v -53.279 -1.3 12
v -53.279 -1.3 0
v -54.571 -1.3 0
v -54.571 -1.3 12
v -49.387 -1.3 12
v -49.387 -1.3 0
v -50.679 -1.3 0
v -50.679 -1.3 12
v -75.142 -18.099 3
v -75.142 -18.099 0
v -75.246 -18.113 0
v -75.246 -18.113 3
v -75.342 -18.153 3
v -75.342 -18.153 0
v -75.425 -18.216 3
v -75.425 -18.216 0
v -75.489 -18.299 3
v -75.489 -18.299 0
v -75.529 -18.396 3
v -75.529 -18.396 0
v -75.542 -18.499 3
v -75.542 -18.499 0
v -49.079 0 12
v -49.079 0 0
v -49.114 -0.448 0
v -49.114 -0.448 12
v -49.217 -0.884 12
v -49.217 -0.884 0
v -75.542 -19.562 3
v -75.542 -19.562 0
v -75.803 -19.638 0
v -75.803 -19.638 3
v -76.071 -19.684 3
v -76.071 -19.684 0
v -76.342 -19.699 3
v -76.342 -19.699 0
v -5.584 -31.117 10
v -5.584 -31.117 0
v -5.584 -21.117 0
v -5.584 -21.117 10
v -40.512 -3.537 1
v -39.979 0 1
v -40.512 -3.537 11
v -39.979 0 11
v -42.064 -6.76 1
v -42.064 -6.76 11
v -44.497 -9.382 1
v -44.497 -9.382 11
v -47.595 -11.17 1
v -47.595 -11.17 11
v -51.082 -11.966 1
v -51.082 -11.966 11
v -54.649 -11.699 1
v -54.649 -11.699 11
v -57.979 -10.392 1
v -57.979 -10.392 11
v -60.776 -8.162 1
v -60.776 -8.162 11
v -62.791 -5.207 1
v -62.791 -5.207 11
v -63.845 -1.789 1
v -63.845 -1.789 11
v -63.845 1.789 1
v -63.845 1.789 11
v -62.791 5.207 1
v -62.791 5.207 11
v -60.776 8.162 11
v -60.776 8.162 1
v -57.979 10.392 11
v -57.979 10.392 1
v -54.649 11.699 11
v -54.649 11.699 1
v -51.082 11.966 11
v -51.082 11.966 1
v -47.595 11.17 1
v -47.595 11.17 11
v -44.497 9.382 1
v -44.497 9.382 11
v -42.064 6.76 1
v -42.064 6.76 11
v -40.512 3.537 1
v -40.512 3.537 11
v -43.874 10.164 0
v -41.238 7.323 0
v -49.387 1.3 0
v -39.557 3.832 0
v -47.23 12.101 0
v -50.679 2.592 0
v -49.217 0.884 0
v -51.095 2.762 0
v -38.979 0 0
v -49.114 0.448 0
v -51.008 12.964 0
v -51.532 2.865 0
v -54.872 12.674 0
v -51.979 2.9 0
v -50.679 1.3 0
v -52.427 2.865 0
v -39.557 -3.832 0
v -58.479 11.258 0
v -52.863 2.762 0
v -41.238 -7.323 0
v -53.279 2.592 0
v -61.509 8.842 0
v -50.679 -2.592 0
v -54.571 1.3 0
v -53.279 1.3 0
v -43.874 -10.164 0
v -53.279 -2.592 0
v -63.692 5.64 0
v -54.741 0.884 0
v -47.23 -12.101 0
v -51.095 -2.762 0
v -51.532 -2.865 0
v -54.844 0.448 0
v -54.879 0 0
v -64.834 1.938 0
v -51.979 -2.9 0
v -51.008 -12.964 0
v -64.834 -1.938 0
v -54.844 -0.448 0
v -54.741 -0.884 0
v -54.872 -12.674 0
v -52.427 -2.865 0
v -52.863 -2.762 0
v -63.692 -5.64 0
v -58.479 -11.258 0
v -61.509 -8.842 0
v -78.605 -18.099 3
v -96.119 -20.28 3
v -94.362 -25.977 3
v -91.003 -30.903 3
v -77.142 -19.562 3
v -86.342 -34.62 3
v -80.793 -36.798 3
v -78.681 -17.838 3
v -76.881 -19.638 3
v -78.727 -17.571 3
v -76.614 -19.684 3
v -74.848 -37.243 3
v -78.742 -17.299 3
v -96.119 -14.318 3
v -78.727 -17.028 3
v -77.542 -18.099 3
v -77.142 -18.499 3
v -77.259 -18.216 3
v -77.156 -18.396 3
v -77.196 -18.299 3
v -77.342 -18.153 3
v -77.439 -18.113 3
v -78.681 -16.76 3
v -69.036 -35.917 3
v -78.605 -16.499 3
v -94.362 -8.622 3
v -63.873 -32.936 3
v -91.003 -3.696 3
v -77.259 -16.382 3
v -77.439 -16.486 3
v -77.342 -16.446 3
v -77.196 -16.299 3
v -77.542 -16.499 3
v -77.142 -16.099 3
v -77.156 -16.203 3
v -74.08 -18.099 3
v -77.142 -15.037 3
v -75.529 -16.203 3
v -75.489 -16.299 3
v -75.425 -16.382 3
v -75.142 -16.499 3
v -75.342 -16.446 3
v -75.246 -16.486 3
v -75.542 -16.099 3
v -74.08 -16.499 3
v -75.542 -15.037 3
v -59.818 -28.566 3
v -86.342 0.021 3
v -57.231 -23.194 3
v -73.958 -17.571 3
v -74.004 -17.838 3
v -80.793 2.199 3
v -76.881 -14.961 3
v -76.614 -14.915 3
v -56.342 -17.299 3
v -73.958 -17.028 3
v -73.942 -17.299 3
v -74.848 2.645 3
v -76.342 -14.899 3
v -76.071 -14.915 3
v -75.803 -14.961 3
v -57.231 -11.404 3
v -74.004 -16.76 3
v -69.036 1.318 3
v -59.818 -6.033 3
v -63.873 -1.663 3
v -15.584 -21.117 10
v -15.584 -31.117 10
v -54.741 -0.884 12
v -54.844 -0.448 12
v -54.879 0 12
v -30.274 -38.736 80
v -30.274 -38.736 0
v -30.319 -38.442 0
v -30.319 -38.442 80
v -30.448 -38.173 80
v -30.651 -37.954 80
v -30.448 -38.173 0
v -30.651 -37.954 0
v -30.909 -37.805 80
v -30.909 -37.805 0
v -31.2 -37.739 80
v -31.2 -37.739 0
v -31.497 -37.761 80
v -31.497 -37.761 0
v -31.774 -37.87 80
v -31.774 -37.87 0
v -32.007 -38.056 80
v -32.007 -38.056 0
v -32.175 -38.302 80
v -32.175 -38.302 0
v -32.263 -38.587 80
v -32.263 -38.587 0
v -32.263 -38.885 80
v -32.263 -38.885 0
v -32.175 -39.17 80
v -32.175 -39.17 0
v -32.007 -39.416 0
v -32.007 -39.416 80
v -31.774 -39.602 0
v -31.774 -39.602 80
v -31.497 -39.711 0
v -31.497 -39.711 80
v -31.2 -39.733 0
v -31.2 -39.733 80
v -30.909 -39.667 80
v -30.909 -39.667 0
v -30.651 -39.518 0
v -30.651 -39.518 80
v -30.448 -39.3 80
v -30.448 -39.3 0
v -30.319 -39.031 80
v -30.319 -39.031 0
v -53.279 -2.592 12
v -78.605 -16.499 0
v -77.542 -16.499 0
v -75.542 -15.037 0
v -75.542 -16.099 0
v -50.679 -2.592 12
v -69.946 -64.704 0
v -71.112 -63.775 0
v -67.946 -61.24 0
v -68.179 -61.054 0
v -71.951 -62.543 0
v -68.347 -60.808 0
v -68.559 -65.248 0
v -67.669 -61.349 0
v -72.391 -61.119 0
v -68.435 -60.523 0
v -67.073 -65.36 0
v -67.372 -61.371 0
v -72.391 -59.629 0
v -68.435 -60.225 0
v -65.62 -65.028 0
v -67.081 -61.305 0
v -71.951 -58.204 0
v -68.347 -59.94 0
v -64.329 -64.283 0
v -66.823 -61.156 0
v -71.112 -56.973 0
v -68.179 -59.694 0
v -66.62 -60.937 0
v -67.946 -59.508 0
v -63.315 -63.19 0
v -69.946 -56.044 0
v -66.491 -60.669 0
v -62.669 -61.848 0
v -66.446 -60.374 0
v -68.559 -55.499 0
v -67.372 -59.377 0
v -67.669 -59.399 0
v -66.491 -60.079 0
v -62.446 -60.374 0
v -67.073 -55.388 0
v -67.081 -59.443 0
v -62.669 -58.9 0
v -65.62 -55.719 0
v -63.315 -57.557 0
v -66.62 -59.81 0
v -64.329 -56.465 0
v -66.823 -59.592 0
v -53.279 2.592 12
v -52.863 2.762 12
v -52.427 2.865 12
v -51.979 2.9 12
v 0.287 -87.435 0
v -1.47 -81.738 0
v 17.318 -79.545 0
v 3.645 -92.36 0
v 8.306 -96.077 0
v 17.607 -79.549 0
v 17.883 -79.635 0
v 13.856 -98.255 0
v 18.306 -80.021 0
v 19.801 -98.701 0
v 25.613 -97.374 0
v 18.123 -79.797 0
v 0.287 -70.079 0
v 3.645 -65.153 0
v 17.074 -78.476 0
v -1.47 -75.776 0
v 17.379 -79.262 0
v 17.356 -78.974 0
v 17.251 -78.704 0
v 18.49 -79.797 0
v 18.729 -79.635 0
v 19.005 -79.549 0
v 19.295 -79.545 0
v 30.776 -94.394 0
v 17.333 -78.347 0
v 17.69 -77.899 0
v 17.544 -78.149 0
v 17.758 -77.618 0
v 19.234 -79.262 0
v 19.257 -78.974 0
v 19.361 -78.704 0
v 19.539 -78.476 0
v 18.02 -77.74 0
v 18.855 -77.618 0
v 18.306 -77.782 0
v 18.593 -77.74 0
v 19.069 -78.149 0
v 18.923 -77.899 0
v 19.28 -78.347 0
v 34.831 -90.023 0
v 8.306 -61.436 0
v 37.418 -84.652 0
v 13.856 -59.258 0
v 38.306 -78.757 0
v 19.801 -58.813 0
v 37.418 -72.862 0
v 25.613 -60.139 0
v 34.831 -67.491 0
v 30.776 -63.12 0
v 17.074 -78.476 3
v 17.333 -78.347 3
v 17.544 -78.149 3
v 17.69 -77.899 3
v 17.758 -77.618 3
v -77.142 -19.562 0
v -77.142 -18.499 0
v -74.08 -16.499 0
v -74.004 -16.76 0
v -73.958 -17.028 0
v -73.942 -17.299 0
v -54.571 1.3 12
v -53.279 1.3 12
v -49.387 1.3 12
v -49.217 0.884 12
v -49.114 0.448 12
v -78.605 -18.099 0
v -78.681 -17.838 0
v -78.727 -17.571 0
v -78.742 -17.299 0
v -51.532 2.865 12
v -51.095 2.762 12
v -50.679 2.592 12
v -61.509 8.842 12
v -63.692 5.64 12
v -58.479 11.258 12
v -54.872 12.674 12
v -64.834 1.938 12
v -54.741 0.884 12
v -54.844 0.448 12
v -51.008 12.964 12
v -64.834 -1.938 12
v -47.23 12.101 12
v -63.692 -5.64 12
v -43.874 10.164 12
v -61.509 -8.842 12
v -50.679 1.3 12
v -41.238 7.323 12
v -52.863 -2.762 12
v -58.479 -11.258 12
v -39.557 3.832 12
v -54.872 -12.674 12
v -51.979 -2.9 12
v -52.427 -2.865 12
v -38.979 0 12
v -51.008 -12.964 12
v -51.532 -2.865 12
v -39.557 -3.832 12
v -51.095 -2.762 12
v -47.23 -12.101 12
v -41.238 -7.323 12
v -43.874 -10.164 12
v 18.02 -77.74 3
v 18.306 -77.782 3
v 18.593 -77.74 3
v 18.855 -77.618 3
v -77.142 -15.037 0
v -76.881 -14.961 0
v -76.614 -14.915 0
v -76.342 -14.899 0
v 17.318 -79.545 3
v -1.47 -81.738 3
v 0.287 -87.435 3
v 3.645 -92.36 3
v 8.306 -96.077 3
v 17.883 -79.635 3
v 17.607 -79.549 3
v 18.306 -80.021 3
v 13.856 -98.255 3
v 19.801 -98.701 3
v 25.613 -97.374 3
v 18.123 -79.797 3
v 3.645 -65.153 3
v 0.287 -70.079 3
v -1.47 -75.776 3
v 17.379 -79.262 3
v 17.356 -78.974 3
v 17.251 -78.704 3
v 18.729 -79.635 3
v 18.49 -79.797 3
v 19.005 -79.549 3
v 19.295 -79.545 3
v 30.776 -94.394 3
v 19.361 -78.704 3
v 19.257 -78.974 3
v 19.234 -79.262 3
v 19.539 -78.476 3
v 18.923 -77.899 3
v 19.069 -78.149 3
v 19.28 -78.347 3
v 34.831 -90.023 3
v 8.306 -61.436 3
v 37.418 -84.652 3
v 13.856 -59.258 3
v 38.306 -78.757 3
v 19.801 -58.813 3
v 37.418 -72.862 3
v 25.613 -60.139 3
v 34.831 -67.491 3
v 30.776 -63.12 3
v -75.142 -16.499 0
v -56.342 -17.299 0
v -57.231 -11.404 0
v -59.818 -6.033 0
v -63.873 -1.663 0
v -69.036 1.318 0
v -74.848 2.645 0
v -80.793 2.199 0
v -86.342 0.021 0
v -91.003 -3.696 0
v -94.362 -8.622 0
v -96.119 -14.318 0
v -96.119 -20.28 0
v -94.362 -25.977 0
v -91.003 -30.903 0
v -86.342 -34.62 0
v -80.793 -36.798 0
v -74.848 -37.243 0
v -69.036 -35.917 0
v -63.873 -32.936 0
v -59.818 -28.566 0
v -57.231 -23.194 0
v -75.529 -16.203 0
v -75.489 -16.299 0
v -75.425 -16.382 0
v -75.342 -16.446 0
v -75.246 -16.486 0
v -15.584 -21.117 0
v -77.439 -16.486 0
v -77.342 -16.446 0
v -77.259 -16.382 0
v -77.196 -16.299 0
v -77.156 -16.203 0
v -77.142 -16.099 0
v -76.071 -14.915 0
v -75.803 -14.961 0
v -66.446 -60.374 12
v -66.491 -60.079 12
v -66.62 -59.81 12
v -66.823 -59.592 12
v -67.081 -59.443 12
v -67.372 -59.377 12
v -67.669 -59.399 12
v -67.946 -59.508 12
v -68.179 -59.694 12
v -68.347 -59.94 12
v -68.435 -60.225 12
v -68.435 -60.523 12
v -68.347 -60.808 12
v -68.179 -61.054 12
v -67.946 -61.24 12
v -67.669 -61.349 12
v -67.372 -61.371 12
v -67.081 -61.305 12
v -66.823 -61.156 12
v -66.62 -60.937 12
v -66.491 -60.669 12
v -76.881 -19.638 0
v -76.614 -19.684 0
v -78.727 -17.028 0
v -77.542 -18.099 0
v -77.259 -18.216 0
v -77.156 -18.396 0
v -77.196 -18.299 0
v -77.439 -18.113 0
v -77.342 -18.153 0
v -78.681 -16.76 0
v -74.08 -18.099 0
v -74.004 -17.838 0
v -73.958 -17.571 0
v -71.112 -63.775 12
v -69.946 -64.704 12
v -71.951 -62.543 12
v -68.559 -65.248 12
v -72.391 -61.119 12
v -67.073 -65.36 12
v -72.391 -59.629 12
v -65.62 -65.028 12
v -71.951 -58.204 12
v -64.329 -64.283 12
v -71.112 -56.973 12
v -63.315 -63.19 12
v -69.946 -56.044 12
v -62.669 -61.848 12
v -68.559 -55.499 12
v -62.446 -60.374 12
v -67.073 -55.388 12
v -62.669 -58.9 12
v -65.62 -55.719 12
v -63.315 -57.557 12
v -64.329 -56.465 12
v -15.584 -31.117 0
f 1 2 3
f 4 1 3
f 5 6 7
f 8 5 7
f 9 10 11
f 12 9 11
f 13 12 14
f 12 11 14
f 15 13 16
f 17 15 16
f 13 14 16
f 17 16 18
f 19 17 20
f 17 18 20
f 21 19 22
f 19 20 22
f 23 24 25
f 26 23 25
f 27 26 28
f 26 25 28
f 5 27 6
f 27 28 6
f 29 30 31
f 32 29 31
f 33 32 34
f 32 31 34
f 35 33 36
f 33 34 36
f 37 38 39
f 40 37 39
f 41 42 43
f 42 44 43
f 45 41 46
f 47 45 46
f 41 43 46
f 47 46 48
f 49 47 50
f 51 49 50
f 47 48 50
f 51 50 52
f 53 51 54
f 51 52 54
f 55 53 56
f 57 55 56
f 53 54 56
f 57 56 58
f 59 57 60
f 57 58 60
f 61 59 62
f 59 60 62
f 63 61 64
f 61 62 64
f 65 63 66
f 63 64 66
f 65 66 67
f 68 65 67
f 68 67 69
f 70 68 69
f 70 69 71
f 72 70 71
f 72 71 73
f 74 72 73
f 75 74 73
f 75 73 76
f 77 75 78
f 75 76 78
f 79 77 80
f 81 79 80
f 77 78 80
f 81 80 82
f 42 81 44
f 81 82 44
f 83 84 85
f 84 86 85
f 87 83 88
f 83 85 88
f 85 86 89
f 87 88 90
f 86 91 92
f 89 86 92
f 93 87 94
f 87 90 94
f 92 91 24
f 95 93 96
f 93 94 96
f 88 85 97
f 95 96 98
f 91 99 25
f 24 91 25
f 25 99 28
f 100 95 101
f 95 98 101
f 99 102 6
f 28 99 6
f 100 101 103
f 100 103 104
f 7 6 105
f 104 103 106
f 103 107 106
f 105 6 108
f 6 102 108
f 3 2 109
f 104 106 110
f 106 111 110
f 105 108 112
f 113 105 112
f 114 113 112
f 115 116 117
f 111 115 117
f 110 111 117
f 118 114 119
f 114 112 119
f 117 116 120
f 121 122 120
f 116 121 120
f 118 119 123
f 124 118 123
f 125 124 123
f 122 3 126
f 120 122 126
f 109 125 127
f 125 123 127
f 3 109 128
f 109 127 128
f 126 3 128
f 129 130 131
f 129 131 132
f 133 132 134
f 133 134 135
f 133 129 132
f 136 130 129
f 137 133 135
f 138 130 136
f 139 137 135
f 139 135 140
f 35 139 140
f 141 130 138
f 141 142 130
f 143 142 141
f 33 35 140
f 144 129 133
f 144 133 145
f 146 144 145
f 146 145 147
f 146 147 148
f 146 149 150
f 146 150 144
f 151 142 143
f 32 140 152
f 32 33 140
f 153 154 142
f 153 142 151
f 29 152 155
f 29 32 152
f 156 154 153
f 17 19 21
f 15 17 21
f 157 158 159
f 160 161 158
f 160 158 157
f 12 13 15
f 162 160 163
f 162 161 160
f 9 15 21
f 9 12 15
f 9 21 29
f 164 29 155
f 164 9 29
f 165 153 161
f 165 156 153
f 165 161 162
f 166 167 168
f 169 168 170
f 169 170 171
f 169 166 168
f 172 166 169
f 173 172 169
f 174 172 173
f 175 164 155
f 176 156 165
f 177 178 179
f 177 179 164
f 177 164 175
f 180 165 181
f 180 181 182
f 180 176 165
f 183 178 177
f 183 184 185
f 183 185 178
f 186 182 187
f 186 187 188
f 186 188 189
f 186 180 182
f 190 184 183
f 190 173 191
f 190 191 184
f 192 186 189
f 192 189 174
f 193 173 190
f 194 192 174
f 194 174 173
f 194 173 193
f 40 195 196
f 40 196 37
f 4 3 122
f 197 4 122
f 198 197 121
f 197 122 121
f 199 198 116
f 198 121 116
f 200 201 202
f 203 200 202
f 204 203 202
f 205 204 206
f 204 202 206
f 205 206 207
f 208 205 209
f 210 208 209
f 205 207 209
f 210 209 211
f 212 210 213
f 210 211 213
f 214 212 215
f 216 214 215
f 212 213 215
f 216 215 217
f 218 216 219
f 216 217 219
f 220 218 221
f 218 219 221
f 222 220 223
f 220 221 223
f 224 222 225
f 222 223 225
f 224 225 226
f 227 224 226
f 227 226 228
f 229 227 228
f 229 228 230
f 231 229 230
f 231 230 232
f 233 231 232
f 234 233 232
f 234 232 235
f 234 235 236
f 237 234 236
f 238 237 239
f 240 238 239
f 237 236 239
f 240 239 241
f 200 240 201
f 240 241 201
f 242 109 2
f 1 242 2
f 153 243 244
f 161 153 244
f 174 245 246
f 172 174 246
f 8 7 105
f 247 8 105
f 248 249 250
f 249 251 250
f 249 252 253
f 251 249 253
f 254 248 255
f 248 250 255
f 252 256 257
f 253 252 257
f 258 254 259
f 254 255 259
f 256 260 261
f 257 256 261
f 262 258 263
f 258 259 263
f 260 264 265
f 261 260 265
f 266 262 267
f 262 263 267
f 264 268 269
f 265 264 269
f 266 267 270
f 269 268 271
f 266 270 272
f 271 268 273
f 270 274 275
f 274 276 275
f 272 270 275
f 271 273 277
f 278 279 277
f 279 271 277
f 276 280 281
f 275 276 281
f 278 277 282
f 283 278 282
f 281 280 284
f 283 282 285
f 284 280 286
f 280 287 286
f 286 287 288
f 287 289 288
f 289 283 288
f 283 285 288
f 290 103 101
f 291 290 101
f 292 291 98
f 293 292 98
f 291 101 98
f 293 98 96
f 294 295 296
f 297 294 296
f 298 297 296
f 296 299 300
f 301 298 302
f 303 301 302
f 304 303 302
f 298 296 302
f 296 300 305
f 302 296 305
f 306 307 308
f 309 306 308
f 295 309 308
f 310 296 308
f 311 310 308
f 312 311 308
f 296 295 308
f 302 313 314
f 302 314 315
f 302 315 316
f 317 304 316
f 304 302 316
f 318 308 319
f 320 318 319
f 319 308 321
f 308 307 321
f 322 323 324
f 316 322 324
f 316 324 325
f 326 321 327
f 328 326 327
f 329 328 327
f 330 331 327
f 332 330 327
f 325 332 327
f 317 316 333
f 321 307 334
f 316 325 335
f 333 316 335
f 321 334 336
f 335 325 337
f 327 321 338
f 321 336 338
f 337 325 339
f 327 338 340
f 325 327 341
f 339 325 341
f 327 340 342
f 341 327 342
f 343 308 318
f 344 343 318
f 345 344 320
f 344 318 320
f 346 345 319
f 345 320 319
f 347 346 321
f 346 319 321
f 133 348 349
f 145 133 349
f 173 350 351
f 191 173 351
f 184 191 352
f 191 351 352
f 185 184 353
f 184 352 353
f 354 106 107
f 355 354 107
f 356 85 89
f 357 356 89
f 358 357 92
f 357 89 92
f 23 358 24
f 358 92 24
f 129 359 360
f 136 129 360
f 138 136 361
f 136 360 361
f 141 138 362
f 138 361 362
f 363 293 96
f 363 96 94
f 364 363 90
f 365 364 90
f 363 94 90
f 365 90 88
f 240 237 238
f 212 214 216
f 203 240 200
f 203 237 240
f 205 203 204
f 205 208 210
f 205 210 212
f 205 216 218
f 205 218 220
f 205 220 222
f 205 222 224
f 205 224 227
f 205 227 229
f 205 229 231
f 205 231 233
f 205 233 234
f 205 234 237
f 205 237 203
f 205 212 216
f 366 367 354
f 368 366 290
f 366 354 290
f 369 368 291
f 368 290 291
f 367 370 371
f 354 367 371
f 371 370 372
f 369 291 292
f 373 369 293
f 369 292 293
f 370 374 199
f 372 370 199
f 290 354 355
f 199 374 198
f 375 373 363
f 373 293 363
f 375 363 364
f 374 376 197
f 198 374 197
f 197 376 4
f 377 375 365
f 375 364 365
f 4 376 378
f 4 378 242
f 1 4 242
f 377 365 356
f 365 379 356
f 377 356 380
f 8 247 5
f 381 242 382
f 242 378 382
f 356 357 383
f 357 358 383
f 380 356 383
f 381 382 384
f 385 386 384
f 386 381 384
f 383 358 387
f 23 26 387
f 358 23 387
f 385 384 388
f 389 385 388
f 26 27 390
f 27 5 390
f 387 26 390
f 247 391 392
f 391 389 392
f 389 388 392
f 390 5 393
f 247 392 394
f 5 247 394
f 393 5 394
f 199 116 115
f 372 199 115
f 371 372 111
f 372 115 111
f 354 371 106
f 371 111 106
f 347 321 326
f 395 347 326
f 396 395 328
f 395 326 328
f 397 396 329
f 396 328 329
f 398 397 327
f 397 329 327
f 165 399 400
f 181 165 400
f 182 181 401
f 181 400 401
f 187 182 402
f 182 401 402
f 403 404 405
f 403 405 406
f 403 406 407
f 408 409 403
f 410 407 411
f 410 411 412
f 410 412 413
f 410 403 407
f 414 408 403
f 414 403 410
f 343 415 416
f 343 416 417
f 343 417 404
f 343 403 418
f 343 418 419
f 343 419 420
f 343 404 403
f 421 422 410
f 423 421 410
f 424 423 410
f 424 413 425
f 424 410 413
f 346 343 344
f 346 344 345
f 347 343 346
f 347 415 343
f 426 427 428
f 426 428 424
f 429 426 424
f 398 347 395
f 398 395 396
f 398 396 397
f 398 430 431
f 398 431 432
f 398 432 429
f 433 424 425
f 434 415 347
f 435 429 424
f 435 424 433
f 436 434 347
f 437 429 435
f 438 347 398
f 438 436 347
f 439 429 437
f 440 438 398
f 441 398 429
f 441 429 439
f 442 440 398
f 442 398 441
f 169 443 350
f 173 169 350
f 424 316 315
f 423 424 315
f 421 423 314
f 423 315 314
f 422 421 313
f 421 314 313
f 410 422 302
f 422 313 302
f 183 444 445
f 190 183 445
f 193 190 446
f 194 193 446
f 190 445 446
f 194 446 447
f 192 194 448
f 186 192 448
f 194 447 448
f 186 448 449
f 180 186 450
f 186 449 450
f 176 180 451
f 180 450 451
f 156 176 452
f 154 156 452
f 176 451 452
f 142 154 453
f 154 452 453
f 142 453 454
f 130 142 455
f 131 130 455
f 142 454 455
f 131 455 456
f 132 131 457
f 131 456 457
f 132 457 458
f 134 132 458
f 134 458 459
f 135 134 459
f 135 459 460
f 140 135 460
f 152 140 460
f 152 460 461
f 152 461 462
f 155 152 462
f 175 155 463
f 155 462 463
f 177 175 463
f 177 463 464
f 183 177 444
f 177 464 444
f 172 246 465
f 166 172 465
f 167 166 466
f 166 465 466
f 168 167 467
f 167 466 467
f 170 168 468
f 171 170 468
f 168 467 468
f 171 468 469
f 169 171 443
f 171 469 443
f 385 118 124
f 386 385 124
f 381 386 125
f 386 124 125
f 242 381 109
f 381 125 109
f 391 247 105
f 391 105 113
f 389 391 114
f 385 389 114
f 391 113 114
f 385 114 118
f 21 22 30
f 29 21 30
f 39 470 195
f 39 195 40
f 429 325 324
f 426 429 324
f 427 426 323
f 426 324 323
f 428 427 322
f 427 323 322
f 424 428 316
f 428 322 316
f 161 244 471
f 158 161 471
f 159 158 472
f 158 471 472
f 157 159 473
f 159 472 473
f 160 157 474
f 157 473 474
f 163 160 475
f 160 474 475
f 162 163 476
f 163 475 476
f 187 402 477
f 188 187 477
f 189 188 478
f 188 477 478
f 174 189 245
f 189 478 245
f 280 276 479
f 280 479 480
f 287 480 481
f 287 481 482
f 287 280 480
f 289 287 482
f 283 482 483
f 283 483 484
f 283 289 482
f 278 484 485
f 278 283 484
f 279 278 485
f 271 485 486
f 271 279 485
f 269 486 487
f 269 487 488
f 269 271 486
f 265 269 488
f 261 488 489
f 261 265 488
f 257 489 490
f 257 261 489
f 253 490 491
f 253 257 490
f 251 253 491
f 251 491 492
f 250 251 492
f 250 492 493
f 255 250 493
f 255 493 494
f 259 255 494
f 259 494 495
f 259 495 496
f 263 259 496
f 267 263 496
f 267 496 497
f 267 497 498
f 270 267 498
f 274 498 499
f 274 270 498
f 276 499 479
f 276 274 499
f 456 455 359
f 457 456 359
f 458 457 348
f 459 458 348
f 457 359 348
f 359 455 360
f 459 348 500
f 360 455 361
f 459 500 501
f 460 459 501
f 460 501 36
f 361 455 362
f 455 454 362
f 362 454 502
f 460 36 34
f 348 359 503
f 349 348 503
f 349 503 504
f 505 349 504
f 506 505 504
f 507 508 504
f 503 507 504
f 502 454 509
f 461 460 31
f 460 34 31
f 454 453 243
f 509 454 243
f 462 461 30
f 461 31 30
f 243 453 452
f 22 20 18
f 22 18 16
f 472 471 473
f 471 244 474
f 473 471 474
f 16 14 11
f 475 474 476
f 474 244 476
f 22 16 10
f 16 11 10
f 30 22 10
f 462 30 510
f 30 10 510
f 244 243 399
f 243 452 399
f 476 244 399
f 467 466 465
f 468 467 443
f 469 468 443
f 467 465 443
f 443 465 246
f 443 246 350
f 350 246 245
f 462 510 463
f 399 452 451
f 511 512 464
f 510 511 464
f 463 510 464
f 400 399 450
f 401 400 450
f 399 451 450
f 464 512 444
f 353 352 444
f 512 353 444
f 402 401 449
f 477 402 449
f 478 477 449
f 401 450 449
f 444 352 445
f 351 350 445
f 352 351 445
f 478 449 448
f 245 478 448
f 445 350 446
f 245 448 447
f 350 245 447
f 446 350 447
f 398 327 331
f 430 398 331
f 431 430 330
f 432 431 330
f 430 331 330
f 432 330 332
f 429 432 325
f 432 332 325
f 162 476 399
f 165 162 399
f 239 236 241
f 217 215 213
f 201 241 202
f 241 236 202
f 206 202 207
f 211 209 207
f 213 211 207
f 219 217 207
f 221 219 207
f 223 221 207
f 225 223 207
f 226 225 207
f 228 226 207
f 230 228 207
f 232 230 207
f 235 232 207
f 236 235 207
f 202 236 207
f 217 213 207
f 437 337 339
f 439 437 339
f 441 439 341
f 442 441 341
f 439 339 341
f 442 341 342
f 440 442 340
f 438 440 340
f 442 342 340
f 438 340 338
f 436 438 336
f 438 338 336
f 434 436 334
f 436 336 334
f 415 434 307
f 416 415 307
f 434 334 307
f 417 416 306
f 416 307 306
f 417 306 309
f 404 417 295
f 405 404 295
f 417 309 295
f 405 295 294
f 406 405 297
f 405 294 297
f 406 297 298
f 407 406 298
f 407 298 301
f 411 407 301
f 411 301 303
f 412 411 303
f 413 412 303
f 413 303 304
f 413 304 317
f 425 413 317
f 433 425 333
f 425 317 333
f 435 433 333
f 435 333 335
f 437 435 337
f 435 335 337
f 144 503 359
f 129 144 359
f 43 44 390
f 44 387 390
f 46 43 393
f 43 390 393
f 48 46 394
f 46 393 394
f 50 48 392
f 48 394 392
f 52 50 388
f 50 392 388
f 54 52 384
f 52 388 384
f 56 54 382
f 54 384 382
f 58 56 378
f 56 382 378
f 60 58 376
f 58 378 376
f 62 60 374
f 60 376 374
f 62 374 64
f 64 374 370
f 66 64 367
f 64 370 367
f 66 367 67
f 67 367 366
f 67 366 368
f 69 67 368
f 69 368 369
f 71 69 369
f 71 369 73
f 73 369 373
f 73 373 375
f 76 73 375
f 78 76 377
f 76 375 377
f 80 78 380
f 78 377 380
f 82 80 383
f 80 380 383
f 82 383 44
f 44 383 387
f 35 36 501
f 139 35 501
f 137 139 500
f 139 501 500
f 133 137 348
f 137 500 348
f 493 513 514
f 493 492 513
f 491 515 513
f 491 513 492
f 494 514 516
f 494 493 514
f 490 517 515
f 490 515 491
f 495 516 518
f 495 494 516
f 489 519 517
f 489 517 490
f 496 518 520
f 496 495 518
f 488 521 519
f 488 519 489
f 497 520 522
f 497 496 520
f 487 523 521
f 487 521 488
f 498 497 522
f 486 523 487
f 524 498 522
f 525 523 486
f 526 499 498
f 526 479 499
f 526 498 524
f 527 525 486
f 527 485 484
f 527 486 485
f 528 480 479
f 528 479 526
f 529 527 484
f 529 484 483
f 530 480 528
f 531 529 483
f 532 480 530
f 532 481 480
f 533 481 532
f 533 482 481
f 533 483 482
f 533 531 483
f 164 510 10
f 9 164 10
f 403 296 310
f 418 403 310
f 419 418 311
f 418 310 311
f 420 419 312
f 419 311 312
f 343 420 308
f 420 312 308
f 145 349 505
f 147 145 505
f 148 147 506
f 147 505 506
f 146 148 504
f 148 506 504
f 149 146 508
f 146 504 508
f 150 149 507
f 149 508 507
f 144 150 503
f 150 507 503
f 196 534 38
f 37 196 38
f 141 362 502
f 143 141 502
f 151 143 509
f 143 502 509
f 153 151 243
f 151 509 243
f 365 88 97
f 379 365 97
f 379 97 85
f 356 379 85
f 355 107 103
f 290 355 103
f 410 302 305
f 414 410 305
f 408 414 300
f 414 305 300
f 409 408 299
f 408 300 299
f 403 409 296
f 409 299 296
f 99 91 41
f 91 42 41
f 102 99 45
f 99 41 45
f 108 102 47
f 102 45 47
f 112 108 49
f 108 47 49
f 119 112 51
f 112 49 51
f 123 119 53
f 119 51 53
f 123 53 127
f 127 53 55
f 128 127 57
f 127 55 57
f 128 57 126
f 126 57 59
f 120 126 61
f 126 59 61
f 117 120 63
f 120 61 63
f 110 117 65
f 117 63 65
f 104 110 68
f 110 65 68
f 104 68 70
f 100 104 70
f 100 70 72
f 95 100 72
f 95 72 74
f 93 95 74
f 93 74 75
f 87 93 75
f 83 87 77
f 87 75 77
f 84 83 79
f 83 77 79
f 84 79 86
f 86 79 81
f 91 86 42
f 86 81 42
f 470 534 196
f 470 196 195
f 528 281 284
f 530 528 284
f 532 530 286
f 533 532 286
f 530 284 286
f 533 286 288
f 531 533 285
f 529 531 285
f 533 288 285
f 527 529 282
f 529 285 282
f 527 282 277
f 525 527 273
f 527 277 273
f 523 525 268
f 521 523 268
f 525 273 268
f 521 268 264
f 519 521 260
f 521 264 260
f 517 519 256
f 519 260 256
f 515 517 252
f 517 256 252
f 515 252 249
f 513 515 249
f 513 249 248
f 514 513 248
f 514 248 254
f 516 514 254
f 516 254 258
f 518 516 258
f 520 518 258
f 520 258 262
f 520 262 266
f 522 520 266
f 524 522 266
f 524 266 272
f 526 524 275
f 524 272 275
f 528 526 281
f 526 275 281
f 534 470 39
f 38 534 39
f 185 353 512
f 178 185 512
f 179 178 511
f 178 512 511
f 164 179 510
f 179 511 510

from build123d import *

# Parameters (mm, degrees)
F0_R      = 20
F1_DEPTH  = 3
F2_R      = 1
F3_DEPTH  = 80
F4_W      = 186.607055
F4_H      = 291.874319
F5_DEPTH  = 308
F6_T      = -2.5
F7_R      = 5
F7_R_2    = 1
F8_DEPTH  = 12
F13_DEPTH = 80.001
F14_R     = 20
F15_DEPTH = 3
F16_W     = 10
F16_H     = 10
F17_DEPTH = 10


with BuildPart() as f1:
    # F0 (on Top) → F1 (new body)
    with BuildSketch(Plane.XY):
        with Locations((18.306399, -78.756906)):
            Circle(F0_R)
        with BuildLine():
            ThreePointArc((17.074124, -78.475647), (17.544113, -78.149004), (17.757985, -77.618113))
            ThreePointArc((17.757985, -77.618113), (18.306399, -77.781906), (18.854813, -77.618113))
            ThreePointArc((18.854813, -77.618113), (19.068684, -78.149004), (19.538673, -78.475647))
            ThreePointArc((19.538673, -78.475647), (19.256953, -78.973864), (19.294606, -79.544975))
            ThreePointArc((19.294606, -79.544975), (18.729435, -79.635351), (18.306399, -80.020871))
            ThreePointArc((18.306399, -80.020871), (17.883362, -79.635351), (17.318191, -79.544975))
            ThreePointArc((17.318191, -79.544975), (17.355844, -78.973864), (17.074124, -78.475647))
        make_face(mode=Mode.SUBTRACT)
    extrude(amount=F1_DEPTH)


with BuildPart() as f3:
    # F2 (on Top) → F3 (new body)
    with BuildSketch(Plane.XY):
        with Locations((-31.274304, -38.736261)):
            Circle(F2_R)
    extrude(amount=F3_DEPTH)


with BuildPart() as f5:
    # F4 (on Top) → F5 (new body)
    with BuildSketch(Plane.XY):
        with Locations((207.804951, 1.009569)):
            Rectangle(F4_W, F4_H)
    extrude(amount=F5_DEPTH)

    # F6
    f6_openings = [f5.faces().sort_by_distance(p)[0] for p in [
        (207.804952, 1.009569, 308),
        (207.804952, 1.009569, 0),
    ]]
    offset(amount=F6_T, openings=f6_openings)


with BuildPart() as f8:
    # F7 (on Top) → F8 (new body)
    with BuildSketch(Plane.XY):
        with Locations((-67.446426, -60.373787)):
            Circle(F7_R)
        with Locations((-67.446426, -60.373787)):
            Circle(F7_R_2, mode=Mode.SUBTRACT)
    extrude(amount=F8_DEPTH)


with BuildPart() as f11:
    # F10 (on Front) → F11 (revolve)
    with BuildSketch(Plane.XZ):
        Polygon((-38.979099, 0), (-39.979099, 1), (-39.979099, 11), (-38.979099, 12), (-50.979099, 12), (-50.979099, 0), align=None)
    revolve(axis=Axis((-51.979099, 0, 6), (0, 0, -1)))

    # F12 (on face) → F13 (cut, through all)
    with BuildSketch(Plane(origin=(0, 0, 0), x_dir=(1, 0, 0), z_dir=(0, 0, -1))):
        with BuildLine():
            Line((-50.679099, 1.3), (-50.679099, 2.592296))
            ThreePointArc((-50.679099, 2.592296), (-51.311139, 2.822026), (-51.979099, 2.9))
            ThreePointArc((-51.979099, 2.9), (-52.647059, 2.822026), (-53.279099, 2.592296))
            Line((-53.279099, 2.592296), (-53.279099, 1.3))
            Line((-53.279099, 1.3), (-54.571395, 1.3))
            ThreePointArc((-54.571395, 1.3), (-54.801125, 0.66796), (-54.879099, 0))
            ThreePointArc((-54.879099, 0), (-54.801125, -0.66796), (-54.571395, -1.3))
            Line((-54.571395, -1.3), (-53.279099, -1.3))
            Line((-53.279099, -1.3), (-53.279099, -2.592296))
            ThreePointArc((-53.279099, -2.592296), (-52.647059, -2.822026), (-51.979099, -2.9))
            ThreePointArc((-51.979099, -2.9), (-51.311139, -2.822026), (-50.679099, -2.592296))
            Line((-50.679099, -2.592296), (-50.679099, -1.3))
            Line((-50.679099, -1.3), (-49.386803, -1.3))
            ThreePointArc((-49.386803, -1.3), (-49.157073, -0.66796), (-49.079099, 0))
            ThreePointArc((-49.079099, 0), (-49.157073, 0.66796), (-49.386803, 1.3))
            Line((-49.386803, 1.3), (-50.679099, 1.3))
        make_face()
    extrude(amount=-F13_DEPTH, mode=Mode.SUBTRACT)


with BuildPart() as f15:
    # F14 (on Top) → F15 (new body)
    with BuildSketch(Plane.XY):
        with Locations((-76.342328, -17.299272)):
            Circle(F14_R)
        with BuildLine():
            ThreePointArc((-78.742328, -17.299272), (-78.707765, -16.893427), (-78.60507, -16.499272))
            Line((-78.60507, -16.499272), (-77.542328, -16.499272))
            ThreePointArc((-77.542328, -16.499272), (-77.259486, -16.382114), (-77.142328, -16.099272))
            Line((-77.142328, -16.099272), (-77.142328, -15.03653))
            ThreePointArc((-77.142328, -15.03653), (-76.748173, -14.933835), (-76.342328, -14.899272))
            ThreePointArc((-76.342328, -14.899272), (-75.936484, -14.933835), (-75.542328, -15.03653))
            Line((-75.542328, -15.03653), (-75.542328, -16.099272))
            ThreePointArc((-75.542328, -16.099272), (-75.425171, -16.382114), (-75.142328, -16.499272))
            Line((-75.142328, -16.499272), (-74.079587, -16.499272))
            ThreePointArc((-74.079587, -16.499272), (-73.976892, -16.893427), (-73.942328, -17.299272))
            ThreePointArc((-73.942328, -17.299272), (-73.976892, -17.705116), (-74.079587, -18.099272))
            Line((-74.079587, -18.099272), (-75.142328, -18.099272))
            ThreePointArc((-75.142328, -18.099272), (-75.425171, -18.216429), (-75.542328, -18.499272))
            Line((-75.542328, -18.499272), (-75.542328, -19.562013))
            ThreePointArc((-75.542328, -19.562013), (-75.936484, -19.664708), (-76.342328, -19.699272))
            ThreePointArc((-76.342328, -19.699272), (-76.748173, -19.664708), (-77.142328, -19.562013))
            Line((-77.142328, -19.562013), (-77.142328, -18.499272))
            ThreePointArc((-77.142328, -18.499272), (-77.259486, -18.216429), (-77.542328, -18.099272))
            Line((-77.542328, -18.099272), (-78.60507, -18.099272))
            ThreePointArc((-78.60507, -18.099272), (-78.707765, -17.705116), (-78.742328, -17.299272))
        make_face(mode=Mode.SUBTRACT)
    extrude(amount=F15_DEPTH)


with BuildPart() as f17:
    # F16 (on Top) → F17 (new body)
    with BuildSketch(Plane.XY):
        with Locations((-10.58371, -26.116693)):
            Rectangle(F16_W, F16_H)
    extrude(amount=F17_DEPTH)


solid = Compound([f1.part, f3.part, f8.part, f11.part, f15.part, f17.part])
